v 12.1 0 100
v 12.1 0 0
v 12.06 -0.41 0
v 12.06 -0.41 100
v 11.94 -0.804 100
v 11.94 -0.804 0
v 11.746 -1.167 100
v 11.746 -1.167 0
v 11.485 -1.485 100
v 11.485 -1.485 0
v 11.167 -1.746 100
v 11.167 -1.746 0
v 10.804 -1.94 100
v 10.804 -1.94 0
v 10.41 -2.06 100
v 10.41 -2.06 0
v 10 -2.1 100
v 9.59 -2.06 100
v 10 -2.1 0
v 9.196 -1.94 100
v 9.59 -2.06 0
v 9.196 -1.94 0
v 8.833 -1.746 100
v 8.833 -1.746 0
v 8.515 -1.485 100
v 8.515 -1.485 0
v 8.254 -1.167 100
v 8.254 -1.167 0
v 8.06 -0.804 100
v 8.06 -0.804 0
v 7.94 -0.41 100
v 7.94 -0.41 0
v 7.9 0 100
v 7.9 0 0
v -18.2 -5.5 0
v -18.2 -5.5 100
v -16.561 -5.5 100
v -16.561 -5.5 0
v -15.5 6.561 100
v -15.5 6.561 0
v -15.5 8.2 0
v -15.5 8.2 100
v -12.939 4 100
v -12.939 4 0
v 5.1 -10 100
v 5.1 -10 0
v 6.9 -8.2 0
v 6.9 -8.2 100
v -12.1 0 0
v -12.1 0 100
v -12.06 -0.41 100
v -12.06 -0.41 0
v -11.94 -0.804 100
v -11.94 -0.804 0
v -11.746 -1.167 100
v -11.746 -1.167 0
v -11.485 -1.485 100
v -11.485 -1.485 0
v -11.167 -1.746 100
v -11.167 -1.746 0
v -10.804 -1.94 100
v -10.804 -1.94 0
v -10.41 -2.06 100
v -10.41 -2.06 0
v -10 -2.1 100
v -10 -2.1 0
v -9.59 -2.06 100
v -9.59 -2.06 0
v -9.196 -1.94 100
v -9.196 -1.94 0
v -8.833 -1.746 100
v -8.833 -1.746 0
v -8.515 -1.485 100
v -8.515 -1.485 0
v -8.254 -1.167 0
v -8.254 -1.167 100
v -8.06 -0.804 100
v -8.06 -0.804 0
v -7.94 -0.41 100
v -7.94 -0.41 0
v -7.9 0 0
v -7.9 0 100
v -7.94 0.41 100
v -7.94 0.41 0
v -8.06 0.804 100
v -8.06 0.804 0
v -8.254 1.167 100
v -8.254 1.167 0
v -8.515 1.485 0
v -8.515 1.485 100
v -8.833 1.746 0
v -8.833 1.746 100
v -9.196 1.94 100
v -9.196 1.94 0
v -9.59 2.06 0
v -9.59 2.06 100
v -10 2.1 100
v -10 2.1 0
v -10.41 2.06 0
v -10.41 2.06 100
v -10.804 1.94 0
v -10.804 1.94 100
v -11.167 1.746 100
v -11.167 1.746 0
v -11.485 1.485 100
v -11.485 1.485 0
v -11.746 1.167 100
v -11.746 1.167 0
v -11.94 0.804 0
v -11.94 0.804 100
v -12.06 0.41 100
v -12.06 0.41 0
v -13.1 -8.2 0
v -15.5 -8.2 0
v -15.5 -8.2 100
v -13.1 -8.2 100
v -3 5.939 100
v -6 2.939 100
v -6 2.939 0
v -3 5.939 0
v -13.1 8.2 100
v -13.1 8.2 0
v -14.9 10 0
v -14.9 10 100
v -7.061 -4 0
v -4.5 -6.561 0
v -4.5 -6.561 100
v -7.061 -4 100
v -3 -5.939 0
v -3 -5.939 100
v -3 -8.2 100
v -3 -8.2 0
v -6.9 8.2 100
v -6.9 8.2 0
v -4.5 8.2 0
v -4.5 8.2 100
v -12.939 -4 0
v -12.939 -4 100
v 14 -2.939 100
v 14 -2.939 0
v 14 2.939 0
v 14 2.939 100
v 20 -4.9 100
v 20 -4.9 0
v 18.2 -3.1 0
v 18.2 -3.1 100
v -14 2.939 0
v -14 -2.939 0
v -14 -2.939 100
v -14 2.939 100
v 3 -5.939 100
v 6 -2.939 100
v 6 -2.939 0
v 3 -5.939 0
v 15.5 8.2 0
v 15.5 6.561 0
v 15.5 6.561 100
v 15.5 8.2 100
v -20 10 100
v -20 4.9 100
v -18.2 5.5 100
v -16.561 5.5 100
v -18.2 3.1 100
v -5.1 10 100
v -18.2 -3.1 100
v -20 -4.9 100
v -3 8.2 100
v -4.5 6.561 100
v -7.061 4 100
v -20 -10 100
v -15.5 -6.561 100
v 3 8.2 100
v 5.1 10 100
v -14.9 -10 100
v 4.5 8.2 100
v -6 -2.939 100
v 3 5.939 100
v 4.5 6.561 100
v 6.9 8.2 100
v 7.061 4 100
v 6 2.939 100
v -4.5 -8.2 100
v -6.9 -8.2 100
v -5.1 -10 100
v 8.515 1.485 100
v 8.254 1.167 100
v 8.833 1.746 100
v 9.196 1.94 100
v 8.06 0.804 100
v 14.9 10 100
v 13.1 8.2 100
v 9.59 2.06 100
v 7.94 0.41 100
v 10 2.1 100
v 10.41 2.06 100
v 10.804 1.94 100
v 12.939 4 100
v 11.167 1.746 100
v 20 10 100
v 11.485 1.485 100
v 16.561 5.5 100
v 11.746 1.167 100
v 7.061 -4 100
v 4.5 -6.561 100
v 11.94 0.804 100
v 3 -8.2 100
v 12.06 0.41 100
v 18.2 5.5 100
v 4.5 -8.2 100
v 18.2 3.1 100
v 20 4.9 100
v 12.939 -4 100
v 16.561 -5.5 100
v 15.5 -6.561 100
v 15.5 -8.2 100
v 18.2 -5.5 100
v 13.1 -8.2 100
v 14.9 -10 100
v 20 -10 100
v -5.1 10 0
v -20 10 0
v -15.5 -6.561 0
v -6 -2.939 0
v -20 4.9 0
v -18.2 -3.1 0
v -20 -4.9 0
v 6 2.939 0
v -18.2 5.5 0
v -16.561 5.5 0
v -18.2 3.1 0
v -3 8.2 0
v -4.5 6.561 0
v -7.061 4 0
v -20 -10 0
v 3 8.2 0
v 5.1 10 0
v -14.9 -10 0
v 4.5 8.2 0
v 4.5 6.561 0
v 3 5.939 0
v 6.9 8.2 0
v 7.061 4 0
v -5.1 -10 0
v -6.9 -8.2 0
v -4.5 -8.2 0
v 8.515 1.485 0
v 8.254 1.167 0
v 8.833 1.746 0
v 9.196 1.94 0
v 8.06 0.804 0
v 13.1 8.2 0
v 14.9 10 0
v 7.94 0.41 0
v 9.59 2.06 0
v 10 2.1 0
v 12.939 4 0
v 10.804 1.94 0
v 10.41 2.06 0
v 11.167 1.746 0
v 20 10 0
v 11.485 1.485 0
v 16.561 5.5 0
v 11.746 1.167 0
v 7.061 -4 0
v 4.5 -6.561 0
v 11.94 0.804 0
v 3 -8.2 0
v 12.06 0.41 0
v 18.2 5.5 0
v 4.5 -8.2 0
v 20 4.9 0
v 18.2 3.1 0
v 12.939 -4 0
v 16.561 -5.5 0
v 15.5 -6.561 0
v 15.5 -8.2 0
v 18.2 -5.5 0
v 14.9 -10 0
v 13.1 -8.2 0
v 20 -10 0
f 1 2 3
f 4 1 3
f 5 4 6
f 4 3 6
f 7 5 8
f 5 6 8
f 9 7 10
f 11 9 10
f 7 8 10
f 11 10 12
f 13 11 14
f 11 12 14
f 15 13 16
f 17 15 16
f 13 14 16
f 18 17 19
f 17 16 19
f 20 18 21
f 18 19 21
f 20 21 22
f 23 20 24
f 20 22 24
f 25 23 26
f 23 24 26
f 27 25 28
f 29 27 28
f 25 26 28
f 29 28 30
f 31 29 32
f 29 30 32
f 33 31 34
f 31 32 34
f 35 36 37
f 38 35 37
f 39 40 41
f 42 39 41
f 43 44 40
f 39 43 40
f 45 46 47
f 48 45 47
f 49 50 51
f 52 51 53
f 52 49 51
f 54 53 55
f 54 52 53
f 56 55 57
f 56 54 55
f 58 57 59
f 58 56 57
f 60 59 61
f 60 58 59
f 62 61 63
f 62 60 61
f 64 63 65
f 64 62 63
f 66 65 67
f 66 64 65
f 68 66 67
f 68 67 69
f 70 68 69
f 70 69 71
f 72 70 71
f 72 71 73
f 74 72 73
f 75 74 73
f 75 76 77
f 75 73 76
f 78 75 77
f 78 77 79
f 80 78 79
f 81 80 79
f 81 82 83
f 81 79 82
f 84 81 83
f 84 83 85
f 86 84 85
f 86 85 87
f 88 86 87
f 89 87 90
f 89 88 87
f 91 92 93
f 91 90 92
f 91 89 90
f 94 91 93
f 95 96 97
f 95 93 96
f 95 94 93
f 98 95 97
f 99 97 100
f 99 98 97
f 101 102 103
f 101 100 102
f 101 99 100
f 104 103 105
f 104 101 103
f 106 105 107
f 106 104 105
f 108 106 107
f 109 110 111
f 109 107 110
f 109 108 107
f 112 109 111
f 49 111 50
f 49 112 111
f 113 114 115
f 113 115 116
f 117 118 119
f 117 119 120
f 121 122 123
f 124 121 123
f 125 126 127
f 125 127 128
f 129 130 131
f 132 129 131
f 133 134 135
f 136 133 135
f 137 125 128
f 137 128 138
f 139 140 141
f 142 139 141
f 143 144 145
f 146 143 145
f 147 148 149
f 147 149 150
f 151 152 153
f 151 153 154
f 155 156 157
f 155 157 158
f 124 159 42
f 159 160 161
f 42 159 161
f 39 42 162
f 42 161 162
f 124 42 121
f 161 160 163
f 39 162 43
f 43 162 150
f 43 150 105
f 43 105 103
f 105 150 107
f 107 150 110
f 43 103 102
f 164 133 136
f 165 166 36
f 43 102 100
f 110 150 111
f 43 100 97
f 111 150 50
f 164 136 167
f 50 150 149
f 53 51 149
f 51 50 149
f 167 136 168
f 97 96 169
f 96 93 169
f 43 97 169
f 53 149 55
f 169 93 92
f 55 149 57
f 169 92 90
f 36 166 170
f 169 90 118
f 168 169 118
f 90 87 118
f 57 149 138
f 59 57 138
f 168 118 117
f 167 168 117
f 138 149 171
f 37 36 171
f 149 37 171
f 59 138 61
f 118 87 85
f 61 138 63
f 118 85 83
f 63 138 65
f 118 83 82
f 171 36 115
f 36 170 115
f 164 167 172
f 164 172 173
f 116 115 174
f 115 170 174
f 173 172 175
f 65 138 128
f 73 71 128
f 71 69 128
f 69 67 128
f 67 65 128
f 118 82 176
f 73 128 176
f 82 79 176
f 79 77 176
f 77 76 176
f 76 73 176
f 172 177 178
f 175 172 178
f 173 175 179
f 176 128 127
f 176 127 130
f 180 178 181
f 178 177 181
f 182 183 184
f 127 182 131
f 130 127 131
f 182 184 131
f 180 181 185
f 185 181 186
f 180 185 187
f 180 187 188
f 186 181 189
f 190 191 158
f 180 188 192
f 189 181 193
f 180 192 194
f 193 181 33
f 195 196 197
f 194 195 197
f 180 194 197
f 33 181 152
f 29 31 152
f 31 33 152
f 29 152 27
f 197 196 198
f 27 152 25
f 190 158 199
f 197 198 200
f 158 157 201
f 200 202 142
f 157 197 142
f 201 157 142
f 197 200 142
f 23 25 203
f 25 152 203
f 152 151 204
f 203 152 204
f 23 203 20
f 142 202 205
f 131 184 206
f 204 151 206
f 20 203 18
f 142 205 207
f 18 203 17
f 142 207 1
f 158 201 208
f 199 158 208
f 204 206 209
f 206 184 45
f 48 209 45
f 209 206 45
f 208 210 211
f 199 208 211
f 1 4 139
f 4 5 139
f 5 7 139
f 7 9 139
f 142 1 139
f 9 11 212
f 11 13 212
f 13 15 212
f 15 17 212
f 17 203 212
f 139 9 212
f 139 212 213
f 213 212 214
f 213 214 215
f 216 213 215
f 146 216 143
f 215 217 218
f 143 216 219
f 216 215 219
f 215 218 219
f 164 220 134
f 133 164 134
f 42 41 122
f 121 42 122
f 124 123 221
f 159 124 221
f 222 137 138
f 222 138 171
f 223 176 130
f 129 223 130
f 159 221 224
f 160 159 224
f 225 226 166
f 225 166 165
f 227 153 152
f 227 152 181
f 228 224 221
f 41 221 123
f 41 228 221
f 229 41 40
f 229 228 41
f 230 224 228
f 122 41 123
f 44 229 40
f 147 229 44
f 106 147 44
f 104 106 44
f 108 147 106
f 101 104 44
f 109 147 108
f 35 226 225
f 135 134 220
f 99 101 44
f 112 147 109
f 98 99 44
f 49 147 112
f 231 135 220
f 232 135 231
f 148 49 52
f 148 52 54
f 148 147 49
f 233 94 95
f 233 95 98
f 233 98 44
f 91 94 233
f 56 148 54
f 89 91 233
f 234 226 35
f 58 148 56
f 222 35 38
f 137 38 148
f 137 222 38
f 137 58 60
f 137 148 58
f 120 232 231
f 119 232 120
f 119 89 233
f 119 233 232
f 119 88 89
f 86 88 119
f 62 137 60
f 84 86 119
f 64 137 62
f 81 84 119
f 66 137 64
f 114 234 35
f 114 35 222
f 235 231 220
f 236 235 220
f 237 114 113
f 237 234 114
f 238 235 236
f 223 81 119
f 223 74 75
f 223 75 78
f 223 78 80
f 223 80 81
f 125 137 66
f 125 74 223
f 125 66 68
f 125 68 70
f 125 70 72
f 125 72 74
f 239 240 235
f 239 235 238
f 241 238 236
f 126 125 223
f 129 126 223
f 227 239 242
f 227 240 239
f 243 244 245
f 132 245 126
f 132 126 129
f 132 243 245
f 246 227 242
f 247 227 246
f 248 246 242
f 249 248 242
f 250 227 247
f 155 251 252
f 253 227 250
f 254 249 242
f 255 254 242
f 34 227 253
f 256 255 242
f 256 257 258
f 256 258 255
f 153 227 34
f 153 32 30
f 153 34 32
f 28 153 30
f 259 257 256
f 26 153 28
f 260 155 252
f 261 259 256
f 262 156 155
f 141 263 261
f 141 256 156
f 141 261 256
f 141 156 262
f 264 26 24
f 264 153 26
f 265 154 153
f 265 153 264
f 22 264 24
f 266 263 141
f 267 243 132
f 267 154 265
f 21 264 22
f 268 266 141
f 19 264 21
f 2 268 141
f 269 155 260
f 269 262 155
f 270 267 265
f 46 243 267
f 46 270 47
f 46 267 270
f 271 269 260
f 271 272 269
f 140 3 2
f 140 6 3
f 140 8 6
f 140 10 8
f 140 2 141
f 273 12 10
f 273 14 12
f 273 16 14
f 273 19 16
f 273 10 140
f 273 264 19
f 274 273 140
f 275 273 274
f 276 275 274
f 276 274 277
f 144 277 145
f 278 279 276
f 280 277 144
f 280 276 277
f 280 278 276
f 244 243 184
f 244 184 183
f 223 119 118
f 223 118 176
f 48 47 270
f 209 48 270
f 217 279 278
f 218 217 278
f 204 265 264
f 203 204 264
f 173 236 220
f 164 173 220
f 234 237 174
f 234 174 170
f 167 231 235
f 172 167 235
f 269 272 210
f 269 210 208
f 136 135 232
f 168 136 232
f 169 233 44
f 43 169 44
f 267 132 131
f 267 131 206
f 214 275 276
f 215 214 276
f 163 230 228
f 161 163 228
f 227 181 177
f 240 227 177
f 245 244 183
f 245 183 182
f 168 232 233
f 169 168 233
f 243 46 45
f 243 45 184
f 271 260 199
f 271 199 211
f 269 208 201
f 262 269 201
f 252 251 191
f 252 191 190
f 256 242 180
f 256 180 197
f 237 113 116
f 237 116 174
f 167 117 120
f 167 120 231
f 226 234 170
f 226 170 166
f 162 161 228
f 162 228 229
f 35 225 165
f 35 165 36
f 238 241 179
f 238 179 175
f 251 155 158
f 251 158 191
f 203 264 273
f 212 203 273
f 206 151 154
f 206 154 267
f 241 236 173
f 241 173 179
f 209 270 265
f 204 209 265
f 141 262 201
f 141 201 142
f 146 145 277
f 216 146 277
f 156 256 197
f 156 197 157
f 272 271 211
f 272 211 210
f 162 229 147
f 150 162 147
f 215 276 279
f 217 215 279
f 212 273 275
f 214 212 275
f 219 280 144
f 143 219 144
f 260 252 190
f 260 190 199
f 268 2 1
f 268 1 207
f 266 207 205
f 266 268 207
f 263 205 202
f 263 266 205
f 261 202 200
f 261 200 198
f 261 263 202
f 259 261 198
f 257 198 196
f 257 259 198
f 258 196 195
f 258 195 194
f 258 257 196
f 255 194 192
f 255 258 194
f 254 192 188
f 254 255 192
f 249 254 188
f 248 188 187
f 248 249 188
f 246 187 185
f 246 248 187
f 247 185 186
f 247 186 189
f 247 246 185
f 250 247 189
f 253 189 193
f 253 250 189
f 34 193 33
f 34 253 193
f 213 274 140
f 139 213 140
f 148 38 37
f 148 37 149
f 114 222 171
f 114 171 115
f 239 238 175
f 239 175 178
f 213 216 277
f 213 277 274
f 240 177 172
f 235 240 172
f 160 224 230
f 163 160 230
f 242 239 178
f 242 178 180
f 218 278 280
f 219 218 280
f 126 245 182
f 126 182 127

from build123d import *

# Parameters (mm, degrees)
PAD_DEPTH            = 100
PAD_MIRRORED_2_DEPTH = 100


with BuildPart() as part:
    # Sketch → Pad (new body)
    with BuildSketch(Plane.XY):
        with BuildLine():
            Line((0, 10), (5.1, 10))
            Line((5.1, 10), (6.9, 8.2))
            Line((6.9, 8.2), (4.5, 8.2))
            Line((4.5, 8.2), (4.5, 6.56066))
            Line((4.5, 6.56066), (7.06066, 4))
            Line((7.06066, 4), (12.93934, 4))
            Line((12.93934, 4), (15.5, 6.56066))
            Line((15.5, 6.56066), (15.5, 8.2))
            Line((15.5, 8.2), (13.1, 8.2))
            Line((13.1, 8.2), (14.9, 10))
            Line((14.9, 10), (20, 10))
            Line((20, 10), (20, 4.9))
            Line((20, 4.9), (18.2, 3.1))
            Line((18.2, 3.1), (18.2, 5.5))
            Line((18.2, 5.5), (16.56066, 5.5))
            Line((16.56066, 5.5), (14, 2.93934))
            Line((14, 2.93934), (14, 0))
            Line((14, 0), (12.1, 0))
            ThreePointArc((12.1, 0), (10, 2.1), (7.9, 0))
            Line((7.9, 0), (6, 0))
            Line((6, 0), (6, 2.93934))
            Line((6, 2.93934), (3, 5.93934))
            Line((3, 5.93934), (3, 8.2))
            Line((3, 8.2), (0, 8.2))
            Line((0, 10), (0, 8.2))
        make_face()
    pad = extrude(amount=PAD_DEPTH)

    # Sketch Mirrored 2 → Pad Mirrored 2 (add)
    with BuildSketch(Plane(origin=(0, 0, 0), x_dir=(-1, 0, 0), z_dir=(0, 0, -1))):
        with BuildLine():
            Line((0, 10), (5.1, 10))
            Line((5.1, 10), (6.9, 8.2))
            Line((6.9, 8.2), (4.5, 8.2))
            Line((4.5, 8.2), (4.5, 6.56066))
            Line((4.5, 6.56066), (7.06066, 4))
            Line((7.06066, 4), (12.93934, 4))
            Line((12.93934, 4), (15.5, 6.56066))
            Line((15.5, 6.56066), (15.5, 8.2))
            Line((15.5, 8.2), (13.1, 8.2))
            Line((13.1, 8.2), (14.9, 10))
            Line((14.9, 10), (20, 10))
            Line((20, 10), (20, 4.9))
            Line((20, 4.9), (18.2, 3.1))
            Line((18.2, 3.1), (18.2, 5.5))
            Line((18.2, 5.5), (16.56066, 5.5))
            Line((16.56066, 5.5), (14, 2.93934))
            Line((14, 2.93934), (14, 0))
            Line((14, 0), (12.1, 0))
            ThreePointArc((12.1, 0), (10, 2.1), (7.9, 0))
            Line((7.9, 0), (6, 0))
            Line((6, 0), (6, 2.93934))
            Line((6, 2.93934), (3, 5.93934))
            Line((3, 5.93934), (3, 8.2))
            Line((3, 8.2), (0, 8.2))
            Line((0, 10), (0, 8.2))
        make_face()
    pad_mirrored_2 = extrude(amount=-PAD_MIRRORED_2_DEPTH)

    # Mirrored001: Pad, Pad Mirrored 2 across Sketch H_Axis
    add(pad.mirror(Plane.ZX))
    add(pad_mirrored_2.mirror(Plane.ZX))


solid = part.part
